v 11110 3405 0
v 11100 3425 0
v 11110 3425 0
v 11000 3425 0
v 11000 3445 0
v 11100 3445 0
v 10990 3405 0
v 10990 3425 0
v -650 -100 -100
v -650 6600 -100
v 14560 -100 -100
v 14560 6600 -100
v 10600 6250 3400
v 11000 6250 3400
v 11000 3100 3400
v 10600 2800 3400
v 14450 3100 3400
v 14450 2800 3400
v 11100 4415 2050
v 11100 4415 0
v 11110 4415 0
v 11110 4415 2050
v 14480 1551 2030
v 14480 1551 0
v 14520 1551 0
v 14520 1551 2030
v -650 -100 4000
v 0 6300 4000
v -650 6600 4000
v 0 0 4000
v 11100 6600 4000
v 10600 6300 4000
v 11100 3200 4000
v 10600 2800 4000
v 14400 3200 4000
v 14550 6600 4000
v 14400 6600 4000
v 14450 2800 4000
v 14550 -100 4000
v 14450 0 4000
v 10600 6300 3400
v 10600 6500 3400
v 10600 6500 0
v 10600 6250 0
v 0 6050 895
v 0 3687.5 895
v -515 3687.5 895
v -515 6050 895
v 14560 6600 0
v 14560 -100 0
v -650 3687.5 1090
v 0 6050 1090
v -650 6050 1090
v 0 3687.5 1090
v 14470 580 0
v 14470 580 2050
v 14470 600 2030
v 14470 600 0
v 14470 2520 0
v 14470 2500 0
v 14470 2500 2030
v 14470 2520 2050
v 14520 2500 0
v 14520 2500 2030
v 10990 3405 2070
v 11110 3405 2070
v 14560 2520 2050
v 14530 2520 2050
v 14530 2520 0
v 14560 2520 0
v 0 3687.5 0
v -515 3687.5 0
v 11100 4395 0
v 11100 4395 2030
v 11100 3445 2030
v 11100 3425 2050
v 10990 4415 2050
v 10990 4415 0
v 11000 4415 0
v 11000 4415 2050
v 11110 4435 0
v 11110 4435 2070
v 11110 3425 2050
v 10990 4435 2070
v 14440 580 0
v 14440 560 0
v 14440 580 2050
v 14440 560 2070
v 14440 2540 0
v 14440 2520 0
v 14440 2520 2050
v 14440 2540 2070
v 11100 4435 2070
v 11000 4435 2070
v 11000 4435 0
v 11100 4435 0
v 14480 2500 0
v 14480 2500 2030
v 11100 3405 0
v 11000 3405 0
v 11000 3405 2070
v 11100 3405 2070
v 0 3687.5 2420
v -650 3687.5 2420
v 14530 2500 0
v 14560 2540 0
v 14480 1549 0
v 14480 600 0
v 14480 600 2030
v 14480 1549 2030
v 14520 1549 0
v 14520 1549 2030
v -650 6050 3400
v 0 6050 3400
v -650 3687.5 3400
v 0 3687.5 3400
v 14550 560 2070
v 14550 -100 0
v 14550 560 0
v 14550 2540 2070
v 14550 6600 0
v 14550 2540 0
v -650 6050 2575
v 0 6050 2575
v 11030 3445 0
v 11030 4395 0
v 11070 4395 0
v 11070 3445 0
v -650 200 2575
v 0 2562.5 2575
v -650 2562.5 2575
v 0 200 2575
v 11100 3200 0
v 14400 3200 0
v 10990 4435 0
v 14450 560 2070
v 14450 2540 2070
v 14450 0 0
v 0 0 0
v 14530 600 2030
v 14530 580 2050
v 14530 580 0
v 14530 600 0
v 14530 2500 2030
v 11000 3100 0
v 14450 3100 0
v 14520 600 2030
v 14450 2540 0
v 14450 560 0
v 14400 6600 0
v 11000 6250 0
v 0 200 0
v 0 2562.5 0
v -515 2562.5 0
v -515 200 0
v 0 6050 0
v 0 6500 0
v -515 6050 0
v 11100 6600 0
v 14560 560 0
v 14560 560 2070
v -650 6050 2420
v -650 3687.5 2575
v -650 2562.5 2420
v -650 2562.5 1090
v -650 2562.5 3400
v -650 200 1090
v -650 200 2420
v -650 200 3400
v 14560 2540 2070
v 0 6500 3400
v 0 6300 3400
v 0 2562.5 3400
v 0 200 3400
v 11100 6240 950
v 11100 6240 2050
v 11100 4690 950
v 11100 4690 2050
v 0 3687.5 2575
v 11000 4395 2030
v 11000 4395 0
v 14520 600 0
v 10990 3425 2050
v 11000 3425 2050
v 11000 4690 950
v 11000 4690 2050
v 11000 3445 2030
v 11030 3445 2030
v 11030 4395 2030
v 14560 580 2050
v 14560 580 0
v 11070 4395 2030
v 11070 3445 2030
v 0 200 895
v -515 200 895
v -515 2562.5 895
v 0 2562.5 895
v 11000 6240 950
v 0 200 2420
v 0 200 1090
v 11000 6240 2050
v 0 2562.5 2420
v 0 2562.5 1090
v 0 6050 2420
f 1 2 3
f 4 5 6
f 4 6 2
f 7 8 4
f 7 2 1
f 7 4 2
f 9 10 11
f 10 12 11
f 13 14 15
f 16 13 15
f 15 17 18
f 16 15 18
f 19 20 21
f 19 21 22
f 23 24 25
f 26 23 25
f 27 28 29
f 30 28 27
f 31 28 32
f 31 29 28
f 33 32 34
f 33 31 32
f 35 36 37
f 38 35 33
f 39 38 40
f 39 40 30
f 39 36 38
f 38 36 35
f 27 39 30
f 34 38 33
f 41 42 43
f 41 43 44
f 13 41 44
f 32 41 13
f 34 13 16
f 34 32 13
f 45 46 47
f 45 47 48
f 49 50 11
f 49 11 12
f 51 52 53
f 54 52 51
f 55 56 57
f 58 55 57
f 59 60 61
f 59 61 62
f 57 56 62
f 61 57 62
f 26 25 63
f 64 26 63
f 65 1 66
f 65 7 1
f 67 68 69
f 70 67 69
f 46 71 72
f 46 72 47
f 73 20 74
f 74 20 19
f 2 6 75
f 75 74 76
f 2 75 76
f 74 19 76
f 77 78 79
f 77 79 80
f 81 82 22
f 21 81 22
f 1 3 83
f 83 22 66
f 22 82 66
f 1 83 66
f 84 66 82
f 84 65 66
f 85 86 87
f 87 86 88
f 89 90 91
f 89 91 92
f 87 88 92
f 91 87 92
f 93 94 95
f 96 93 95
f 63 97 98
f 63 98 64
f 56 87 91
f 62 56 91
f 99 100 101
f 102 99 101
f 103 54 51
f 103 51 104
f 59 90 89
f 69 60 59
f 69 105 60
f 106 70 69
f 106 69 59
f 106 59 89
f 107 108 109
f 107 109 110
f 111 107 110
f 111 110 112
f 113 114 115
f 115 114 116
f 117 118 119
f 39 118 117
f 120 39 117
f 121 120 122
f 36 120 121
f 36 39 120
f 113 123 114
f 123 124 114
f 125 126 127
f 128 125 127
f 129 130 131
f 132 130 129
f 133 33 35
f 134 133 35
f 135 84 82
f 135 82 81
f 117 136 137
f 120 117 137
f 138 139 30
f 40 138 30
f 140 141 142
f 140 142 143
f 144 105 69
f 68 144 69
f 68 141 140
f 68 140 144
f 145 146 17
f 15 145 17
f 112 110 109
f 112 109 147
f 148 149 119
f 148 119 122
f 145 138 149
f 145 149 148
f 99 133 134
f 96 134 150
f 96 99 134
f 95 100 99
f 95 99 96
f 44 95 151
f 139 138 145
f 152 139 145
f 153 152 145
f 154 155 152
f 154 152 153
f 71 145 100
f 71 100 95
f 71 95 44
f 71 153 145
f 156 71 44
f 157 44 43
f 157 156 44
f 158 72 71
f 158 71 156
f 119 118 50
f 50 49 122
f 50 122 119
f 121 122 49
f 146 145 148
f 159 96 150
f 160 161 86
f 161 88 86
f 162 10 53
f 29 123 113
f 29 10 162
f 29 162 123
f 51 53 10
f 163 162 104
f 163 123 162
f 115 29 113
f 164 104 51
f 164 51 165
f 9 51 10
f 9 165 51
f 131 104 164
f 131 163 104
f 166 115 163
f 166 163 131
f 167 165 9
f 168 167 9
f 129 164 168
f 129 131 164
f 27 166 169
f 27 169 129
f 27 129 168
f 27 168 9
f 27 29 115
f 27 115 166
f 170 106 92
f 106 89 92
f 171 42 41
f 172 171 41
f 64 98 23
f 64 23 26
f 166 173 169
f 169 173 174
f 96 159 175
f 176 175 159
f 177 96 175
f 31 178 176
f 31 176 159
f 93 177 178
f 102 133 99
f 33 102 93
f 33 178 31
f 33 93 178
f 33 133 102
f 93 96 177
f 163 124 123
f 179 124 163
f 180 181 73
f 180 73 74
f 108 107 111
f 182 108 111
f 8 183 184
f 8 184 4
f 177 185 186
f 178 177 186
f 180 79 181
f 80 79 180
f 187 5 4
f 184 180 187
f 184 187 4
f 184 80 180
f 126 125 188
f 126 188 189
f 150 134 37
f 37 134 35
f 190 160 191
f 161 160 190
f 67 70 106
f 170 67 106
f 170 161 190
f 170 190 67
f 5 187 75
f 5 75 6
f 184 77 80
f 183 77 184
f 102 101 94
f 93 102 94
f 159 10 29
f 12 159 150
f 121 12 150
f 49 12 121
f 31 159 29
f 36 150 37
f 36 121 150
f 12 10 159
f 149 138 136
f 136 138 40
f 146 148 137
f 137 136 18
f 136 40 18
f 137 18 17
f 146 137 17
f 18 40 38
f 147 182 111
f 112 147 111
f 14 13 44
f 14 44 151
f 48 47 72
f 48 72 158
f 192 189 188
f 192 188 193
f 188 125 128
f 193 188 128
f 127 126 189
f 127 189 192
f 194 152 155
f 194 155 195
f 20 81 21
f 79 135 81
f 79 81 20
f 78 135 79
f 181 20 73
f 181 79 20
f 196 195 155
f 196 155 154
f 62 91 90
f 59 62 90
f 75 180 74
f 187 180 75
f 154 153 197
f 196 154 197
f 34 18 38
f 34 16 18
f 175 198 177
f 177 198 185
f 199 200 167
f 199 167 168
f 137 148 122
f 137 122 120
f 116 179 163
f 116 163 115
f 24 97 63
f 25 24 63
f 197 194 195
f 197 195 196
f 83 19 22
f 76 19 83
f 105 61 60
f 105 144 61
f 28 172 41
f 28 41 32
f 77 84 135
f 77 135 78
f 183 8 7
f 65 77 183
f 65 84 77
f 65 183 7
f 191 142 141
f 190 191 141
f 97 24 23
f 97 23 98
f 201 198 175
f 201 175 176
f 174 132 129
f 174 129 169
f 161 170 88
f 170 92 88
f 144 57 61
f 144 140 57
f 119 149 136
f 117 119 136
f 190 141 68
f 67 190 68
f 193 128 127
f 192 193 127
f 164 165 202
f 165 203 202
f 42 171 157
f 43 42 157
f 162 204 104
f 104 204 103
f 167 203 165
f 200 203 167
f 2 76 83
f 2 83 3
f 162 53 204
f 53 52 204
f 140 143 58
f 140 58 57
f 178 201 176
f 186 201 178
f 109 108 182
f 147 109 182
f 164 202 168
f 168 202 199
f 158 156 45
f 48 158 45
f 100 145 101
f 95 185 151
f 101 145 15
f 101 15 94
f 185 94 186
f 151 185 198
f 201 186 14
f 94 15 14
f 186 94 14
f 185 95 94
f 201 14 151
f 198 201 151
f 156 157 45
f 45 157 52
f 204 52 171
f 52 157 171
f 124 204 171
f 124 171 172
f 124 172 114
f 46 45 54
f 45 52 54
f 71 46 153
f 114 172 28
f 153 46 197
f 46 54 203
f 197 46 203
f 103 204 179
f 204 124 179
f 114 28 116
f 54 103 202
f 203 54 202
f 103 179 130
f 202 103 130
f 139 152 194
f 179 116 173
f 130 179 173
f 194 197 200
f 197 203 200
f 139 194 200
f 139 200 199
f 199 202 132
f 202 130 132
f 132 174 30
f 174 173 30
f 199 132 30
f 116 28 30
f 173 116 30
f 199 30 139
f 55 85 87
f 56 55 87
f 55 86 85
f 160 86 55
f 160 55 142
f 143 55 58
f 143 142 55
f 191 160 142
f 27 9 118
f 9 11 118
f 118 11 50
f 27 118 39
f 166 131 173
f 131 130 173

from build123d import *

# Parameters (mm, degrees)
F1_DEPTH       = 14500
F2_W           = 6700
F2_H           = 4100
F3_DEPTH       = 100
F4_W           = 3500
F4_H           = 4100
F5_DEPTH       = 3500
F6_W           = 3300
F6_H           = 3300
F7_DEPTH       = 4000
F8_W           = 3300
F8_H           = 4000
F9_DEPTH       = 300
F11_DEPTH      = 60
F11_DEPTH_BACK = 60
F13_DEPTH      = 30
F13_DEPTH_BACK = 30
F16_DEPTH      = 50
F17_W          = 6700
F17_H          = 4100
F17_W_2        = 1980
F17_H_2        = 2070
F18_DEPTH      = 50
F18_DEPTH_BACK = 50
F20_DEPTH      = 100
F21_W          = 40
F21_H          = 949
F22_DEPTH      = 2030
F23_W          = 6700
F23_H          = 100
F24_DEPTH      = 10
F26_DEPTH      = 10
F26_DEPTH_BACK = 110
F28_DEPTH      = 100
F29_W          = 40
F29_H          = 950
F30_DEPTH      = 2030
F31_W          = 2362.5
F31_H          = 1330
F32_DEPTH      = 100
F33_W          = 2362.5
F33_H          = 825
F34_DEPTH      = 100
F35_W          = 6700
F35_H          = 4100
F35_W_2        = 2362.5
F35_H_2        = 1330
F35_H_3        = 825
F36_DEPTH      = 35
F37_W          = 6700
F37_H          = 4100
F37_W_2        = 2362.5
F37_H_2        = 1330
F37_H_3        = 825
F38_DEPTH      = 515
F39_W          = 2362.5
F39_H          = 895
F40_DEPTH      = 515
F41_W          = 400
F41_H          = 600
F42_DEPTH      = 3700
F43_W          = 300
F43_H          = 600
F44_DEPTH      = 3450
F45_W          = 200
F45_H          = 600
F46_DEPTH      = 10600
F47_W          = 400
F47_H          = 250
F48_DEPTH      = 3400
F49_W          = 1550
F49_H          = 1100
F50_DEPTH      = 100


with BuildPart() as f1:
    # F0 (on Right) → F1 (new body)
    with BuildSketch(Plane.YZ):
        Polygon((6500, 0), (0, 0), (0, 4000), (-100, 4000), (-100, -100), (6600, -100), (6600, 4000), (6500, 4000), align=None)
    extrude(amount=F1_DEPTH)

    # F2 (on face) → F3 (join)
    with BuildSketch(Plane(origin=(0, 0, 0), x_dir=(0, -1, 0), z_dir=(-1, 0, 0))):
        with Locations((-3250, 1950)):
            Rectangle(F2_W, F2_H)
    extrude(amount=F3_DEPTH)

    # F4 (on face) → F5 (join)
    with BuildSketch(Plane.YZ.offset(14500)):
        with Locations((4850, 1950)):
            Rectangle(F4_W, F4_H)
    extrude(amount=-F5_DEPTH)

    # F6 (on face) → F7 (cut)
    with BuildSketch(Plane.XY.offset(4000)):
        with Locations((12750, 4850)):
            Rectangle(F6_W, F6_H)
    extrude(amount=-F7_DEPTH, mode=Mode.SUBTRACT)

    # F8 (on face) → F9 (cut)
    with BuildSketch(Plane.XZ.offset(-6500)):
        with Locations((12750, 2000)):
            Rectangle(F8_W, F8_H)
    extrude(amount=-F9_DEPTH, mode=Mode.SUBTRACT)

    # F15 (on face) → F16 (join)
    with BuildSketch(Plane.YZ.offset(14500)):
        Polygon((0, 4000), (0, 0), (560, 0), (560, 2070), (2540, 2070), (2540, 0), (3100, 0), (3100, 4000), align=None)
    extrude(amount=-F16_DEPTH)

    # F17 (on face) → F18 (join, two sides)
    with BuildSketch(Plane.YZ.offset(14500)) as f18_sk:
        with Locations((3250, 1950)):
            Rectangle(F17_W, F17_H)
        with Locations((1550, 1035)):
            Rectangle(F17_W_2, F17_H_2, mode=Mode.SUBTRACT)
    extrude(amount=F18_DEPTH)
    extrude(f18_sk.sketch, amount=-F18_DEPTH_BACK)

    # F19 (on face) → F20 (cut, through all)
    with BuildSketch(Plane(origin=(11000, 0, 0), x_dir=(0, -1, 0), z_dir=(-1, 0, 0))):
        Polygon((-3545, 0), (-3405, 0), (-3405, 2070), (-3445, 2070), (-4395, 2070), (-4435, 2070), (-4435, 0), align=None)
    extrude(amount=-F20_DEPTH, mode=Mode.SUBTRACT)

    # F23 (on face) → F24 (join, through all)
    with BuildSketch(Plane.YZ.offset(14550)):
        with Locations((3250, -50)):
            Rectangle(F23_W, F23_H)
    extrude(amount=F24_DEPTH)

    # F31 (on face) → F32 (cut, through all)
    with BuildSketch(Plane.YZ):
        with Locations((1381.25, 1755)):
            Rectangle(F31_W, F31_H)
        with Locations((4868.75, 1755)):
            Rectangle(F31_W, F31_H)
    extrude(amount=-F32_DEPTH, mode=Mode.SUBTRACT)

    # F33 (on face) → F34 (cut, through all)
    with BuildSketch(Plane.YZ):
        with Locations((1381.25, 2987.5)):
            Rectangle(F33_W, F33_H)
        with Locations((4868.75, 2987.5)):
            Rectangle(F33_W, F33_H)
    extrude(amount=-F34_DEPTH, mode=Mode.SUBTRACT)

    # F35 (on face) → F36 (join)
    with BuildSketch(Plane(origin=(-100, 0, 0), x_dir=(0, -1, 0), z_dir=(-1, 0, 0))):
        with Locations((-3250, 1950)):
            Rectangle(F35_W, F35_H)
        with Locations((-4868.75, 1755)):
            Rectangle(F35_W_2, F35_H_2, mode=Mode.SUBTRACT)
        with Locations((-1381.25, 1755)):
            Rectangle(F35_W_2, F35_H_2, mode=Mode.SUBTRACT)
        with Locations((-4868.75, 2987.5)):
            Rectangle(F35_W_2, F35_H_3, mode=Mode.SUBTRACT)
        with Locations((-1381.25, 2987.5)):
            Rectangle(F35_W_2, F35_H_3, mode=Mode.SUBTRACT)
    extrude(amount=F36_DEPTH)

    # F37 (on face) → F38 (join)
    with BuildSketch(Plane(origin=(-135, 0, 0), x_dir=(0, -1, 0), z_dir=(-1, 0, 0))):
        with Locations((-3250, 1950)):
            Rectangle(F37_W, F37_H)
        with Locations((-4868.75, 1755)):
            Rectangle(F37_W_2, F37_H_2, mode=Mode.SUBTRACT)
        with Locations((-1381.25, 1755)):
            Rectangle(F37_W_2, F37_H_2, mode=Mode.SUBTRACT)
        with Locations((-4868.75, 2987.5)):
            Rectangle(F37_W_2, F37_H_3, mode=Mode.SUBTRACT)
        with Locations((-1381.25, 2987.5)):
            Rectangle(F37_W_2, F37_H_3, mode=Mode.SUBTRACT)
    extrude(amount=F38_DEPTH)

    # F39 (on face) → F40 (cut)
    with BuildSketch(Plane.YZ):
        with Locations((1381.25, 447.5)):
            Rectangle(F39_W, F39_H)
        with Locations((4868.75, 447.5)):
            Rectangle(F39_W, F39_H)
    extrude(amount=-F40_DEPTH, mode=Mode.SUBTRACT)

    # F41 (on face) → F42 (join)
    with BuildSketch(Plane.XZ.offset(-6500)):
        with Locations((10800, 3700)):
            Rectangle(F41_W, F41_H)
    extrude(amount=F42_DEPTH)

    # F43 (on face) → F44 (join, through all)
    with BuildSketch(Plane.YZ.offset(11000)):
        with Locations((2950, 3700)):
            Rectangle(F43_W, F43_H)
    extrude(amount=F44_DEPTH)

    # F45 (on face) → F46 (join, through all)
    with BuildSketch(Plane(origin=(10600, 0, 0), x_dir=(0, -1, 0), z_dir=(-1, 0, 0))):
        with Locations((-6400, 3700)):
            Rectangle(F45_W, F45_H)
    extrude(amount=F46_DEPTH)

    # F47 (on face) → F48 (join, through all)
    with BuildSketch(Plane(origin=(0, 0, 3400), x_dir=(1, 0, 0), z_dir=(0, 0, -1))):
        with Locations((10800, -6375)):
            Rectangle(F47_W, F47_H)
    extrude(amount=F48_DEPTH)

    # F49 (on face) → F50 (cut, through all)
    with BuildSketch(Plane(origin=(11000, 0, 0), x_dir=(0, -1, 0), z_dir=(-1, 0, 0))):
        with Locations((-5465, 1500)):
            Rectangle(F49_W, F49_H)
    extrude(amount=-F50_DEPTH, mode=Mode.SUBTRACT)


with BuildPart() as f11:
    # F10 (on face) → F11 (new body, two sides)
    with BuildSketch(Plane.YZ.offset(14500)) as f11_sk:
        Polygon((2520, 2050), (2520, 0), (2540, 0), (2540, 2020), (2540, 2070), (1550, 2070), (560, 2070), (560, 2020), (560, 0), (580, 0), (580, 2050), align=None)
    extrude(amount=-F11_DEPTH)
    extrude(f11_sk.sketch, amount=F11_DEPTH_BACK)

    # F12 (on face) → F13 (join, two sides)
    with BuildSketch(Plane.YZ.offset(14500)) as f13_sk:
        Polygon((2500, 0), (2520, 0), (2520, 2050), (580, 2050), (580, 0), (600, 0), (600, 2030), (2500, 2030), align=None)
    extrude(amount=F13_DEPTH)
    extrude(f13_sk.sketch, amount=-F13_DEPTH_BACK)


with BuildPart() as f22:
    # F21 (on face) → F22 (new body, through all)
    with BuildSketch(Plane.XY):
        with Locations((14500, 2025.5)):
            Rectangle(F21_W, F21_H)
    extrude(amount=F22_DEPTH)


with BuildPart() as f22b:
    # F21 (on face) → F22, piece 2 (new body, through all)
    with BuildSketch(Plane.XY):
        with Locations((14500, 1074.5)):
            Rectangle(F21_W, F21_H)
    extrude(amount=F22_DEPTH)


with BuildPart() as f26:
    # F25 (on face) → F26 (new body, two sides)
    with BuildSketch(Plane(origin=(11000, 0, 0), x_dir=(0, -1, 0), z_dir=(-1, 0, 0))) as f26_sk:
        Polygon((-3405, 2070), (-4435, 2070), (-4435, 0), (-4415, 0), (-4415, 2050), (-3425, 2050), (-3425, 0), (-3405, 0), align=None)
    extrude(amount=F26_DEPTH)
    extrude(f26_sk.sketch, amount=-F26_DEPTH_BACK)

    # F27 (on face) → F28 (join)
    with BuildSketch(Plane(origin=(11000, 0, 0), x_dir=(0, -1, 0), z_dir=(-1, 0, 0))):
        Polygon((-4415, 2050), (-4415, 0), (-4395, 0), (-4395, 2030), (-3445, 2030), (-3445, 0), (-3425, 0), (-3425, 2050), align=None)
    extrude(amount=-F28_DEPTH)


with BuildPart() as f30:
    # F29 (on face) → F30 (new body, through all)
    with BuildSketch(Plane.XY):
        with Locations((11050, 3920)):
            Rectangle(F29_W, F29_H)
    extrude(amount=F30_DEPTH)


solid = Compound([f1.part, f11.part, f22.part, f22b.part, f26.part, f30.part])
